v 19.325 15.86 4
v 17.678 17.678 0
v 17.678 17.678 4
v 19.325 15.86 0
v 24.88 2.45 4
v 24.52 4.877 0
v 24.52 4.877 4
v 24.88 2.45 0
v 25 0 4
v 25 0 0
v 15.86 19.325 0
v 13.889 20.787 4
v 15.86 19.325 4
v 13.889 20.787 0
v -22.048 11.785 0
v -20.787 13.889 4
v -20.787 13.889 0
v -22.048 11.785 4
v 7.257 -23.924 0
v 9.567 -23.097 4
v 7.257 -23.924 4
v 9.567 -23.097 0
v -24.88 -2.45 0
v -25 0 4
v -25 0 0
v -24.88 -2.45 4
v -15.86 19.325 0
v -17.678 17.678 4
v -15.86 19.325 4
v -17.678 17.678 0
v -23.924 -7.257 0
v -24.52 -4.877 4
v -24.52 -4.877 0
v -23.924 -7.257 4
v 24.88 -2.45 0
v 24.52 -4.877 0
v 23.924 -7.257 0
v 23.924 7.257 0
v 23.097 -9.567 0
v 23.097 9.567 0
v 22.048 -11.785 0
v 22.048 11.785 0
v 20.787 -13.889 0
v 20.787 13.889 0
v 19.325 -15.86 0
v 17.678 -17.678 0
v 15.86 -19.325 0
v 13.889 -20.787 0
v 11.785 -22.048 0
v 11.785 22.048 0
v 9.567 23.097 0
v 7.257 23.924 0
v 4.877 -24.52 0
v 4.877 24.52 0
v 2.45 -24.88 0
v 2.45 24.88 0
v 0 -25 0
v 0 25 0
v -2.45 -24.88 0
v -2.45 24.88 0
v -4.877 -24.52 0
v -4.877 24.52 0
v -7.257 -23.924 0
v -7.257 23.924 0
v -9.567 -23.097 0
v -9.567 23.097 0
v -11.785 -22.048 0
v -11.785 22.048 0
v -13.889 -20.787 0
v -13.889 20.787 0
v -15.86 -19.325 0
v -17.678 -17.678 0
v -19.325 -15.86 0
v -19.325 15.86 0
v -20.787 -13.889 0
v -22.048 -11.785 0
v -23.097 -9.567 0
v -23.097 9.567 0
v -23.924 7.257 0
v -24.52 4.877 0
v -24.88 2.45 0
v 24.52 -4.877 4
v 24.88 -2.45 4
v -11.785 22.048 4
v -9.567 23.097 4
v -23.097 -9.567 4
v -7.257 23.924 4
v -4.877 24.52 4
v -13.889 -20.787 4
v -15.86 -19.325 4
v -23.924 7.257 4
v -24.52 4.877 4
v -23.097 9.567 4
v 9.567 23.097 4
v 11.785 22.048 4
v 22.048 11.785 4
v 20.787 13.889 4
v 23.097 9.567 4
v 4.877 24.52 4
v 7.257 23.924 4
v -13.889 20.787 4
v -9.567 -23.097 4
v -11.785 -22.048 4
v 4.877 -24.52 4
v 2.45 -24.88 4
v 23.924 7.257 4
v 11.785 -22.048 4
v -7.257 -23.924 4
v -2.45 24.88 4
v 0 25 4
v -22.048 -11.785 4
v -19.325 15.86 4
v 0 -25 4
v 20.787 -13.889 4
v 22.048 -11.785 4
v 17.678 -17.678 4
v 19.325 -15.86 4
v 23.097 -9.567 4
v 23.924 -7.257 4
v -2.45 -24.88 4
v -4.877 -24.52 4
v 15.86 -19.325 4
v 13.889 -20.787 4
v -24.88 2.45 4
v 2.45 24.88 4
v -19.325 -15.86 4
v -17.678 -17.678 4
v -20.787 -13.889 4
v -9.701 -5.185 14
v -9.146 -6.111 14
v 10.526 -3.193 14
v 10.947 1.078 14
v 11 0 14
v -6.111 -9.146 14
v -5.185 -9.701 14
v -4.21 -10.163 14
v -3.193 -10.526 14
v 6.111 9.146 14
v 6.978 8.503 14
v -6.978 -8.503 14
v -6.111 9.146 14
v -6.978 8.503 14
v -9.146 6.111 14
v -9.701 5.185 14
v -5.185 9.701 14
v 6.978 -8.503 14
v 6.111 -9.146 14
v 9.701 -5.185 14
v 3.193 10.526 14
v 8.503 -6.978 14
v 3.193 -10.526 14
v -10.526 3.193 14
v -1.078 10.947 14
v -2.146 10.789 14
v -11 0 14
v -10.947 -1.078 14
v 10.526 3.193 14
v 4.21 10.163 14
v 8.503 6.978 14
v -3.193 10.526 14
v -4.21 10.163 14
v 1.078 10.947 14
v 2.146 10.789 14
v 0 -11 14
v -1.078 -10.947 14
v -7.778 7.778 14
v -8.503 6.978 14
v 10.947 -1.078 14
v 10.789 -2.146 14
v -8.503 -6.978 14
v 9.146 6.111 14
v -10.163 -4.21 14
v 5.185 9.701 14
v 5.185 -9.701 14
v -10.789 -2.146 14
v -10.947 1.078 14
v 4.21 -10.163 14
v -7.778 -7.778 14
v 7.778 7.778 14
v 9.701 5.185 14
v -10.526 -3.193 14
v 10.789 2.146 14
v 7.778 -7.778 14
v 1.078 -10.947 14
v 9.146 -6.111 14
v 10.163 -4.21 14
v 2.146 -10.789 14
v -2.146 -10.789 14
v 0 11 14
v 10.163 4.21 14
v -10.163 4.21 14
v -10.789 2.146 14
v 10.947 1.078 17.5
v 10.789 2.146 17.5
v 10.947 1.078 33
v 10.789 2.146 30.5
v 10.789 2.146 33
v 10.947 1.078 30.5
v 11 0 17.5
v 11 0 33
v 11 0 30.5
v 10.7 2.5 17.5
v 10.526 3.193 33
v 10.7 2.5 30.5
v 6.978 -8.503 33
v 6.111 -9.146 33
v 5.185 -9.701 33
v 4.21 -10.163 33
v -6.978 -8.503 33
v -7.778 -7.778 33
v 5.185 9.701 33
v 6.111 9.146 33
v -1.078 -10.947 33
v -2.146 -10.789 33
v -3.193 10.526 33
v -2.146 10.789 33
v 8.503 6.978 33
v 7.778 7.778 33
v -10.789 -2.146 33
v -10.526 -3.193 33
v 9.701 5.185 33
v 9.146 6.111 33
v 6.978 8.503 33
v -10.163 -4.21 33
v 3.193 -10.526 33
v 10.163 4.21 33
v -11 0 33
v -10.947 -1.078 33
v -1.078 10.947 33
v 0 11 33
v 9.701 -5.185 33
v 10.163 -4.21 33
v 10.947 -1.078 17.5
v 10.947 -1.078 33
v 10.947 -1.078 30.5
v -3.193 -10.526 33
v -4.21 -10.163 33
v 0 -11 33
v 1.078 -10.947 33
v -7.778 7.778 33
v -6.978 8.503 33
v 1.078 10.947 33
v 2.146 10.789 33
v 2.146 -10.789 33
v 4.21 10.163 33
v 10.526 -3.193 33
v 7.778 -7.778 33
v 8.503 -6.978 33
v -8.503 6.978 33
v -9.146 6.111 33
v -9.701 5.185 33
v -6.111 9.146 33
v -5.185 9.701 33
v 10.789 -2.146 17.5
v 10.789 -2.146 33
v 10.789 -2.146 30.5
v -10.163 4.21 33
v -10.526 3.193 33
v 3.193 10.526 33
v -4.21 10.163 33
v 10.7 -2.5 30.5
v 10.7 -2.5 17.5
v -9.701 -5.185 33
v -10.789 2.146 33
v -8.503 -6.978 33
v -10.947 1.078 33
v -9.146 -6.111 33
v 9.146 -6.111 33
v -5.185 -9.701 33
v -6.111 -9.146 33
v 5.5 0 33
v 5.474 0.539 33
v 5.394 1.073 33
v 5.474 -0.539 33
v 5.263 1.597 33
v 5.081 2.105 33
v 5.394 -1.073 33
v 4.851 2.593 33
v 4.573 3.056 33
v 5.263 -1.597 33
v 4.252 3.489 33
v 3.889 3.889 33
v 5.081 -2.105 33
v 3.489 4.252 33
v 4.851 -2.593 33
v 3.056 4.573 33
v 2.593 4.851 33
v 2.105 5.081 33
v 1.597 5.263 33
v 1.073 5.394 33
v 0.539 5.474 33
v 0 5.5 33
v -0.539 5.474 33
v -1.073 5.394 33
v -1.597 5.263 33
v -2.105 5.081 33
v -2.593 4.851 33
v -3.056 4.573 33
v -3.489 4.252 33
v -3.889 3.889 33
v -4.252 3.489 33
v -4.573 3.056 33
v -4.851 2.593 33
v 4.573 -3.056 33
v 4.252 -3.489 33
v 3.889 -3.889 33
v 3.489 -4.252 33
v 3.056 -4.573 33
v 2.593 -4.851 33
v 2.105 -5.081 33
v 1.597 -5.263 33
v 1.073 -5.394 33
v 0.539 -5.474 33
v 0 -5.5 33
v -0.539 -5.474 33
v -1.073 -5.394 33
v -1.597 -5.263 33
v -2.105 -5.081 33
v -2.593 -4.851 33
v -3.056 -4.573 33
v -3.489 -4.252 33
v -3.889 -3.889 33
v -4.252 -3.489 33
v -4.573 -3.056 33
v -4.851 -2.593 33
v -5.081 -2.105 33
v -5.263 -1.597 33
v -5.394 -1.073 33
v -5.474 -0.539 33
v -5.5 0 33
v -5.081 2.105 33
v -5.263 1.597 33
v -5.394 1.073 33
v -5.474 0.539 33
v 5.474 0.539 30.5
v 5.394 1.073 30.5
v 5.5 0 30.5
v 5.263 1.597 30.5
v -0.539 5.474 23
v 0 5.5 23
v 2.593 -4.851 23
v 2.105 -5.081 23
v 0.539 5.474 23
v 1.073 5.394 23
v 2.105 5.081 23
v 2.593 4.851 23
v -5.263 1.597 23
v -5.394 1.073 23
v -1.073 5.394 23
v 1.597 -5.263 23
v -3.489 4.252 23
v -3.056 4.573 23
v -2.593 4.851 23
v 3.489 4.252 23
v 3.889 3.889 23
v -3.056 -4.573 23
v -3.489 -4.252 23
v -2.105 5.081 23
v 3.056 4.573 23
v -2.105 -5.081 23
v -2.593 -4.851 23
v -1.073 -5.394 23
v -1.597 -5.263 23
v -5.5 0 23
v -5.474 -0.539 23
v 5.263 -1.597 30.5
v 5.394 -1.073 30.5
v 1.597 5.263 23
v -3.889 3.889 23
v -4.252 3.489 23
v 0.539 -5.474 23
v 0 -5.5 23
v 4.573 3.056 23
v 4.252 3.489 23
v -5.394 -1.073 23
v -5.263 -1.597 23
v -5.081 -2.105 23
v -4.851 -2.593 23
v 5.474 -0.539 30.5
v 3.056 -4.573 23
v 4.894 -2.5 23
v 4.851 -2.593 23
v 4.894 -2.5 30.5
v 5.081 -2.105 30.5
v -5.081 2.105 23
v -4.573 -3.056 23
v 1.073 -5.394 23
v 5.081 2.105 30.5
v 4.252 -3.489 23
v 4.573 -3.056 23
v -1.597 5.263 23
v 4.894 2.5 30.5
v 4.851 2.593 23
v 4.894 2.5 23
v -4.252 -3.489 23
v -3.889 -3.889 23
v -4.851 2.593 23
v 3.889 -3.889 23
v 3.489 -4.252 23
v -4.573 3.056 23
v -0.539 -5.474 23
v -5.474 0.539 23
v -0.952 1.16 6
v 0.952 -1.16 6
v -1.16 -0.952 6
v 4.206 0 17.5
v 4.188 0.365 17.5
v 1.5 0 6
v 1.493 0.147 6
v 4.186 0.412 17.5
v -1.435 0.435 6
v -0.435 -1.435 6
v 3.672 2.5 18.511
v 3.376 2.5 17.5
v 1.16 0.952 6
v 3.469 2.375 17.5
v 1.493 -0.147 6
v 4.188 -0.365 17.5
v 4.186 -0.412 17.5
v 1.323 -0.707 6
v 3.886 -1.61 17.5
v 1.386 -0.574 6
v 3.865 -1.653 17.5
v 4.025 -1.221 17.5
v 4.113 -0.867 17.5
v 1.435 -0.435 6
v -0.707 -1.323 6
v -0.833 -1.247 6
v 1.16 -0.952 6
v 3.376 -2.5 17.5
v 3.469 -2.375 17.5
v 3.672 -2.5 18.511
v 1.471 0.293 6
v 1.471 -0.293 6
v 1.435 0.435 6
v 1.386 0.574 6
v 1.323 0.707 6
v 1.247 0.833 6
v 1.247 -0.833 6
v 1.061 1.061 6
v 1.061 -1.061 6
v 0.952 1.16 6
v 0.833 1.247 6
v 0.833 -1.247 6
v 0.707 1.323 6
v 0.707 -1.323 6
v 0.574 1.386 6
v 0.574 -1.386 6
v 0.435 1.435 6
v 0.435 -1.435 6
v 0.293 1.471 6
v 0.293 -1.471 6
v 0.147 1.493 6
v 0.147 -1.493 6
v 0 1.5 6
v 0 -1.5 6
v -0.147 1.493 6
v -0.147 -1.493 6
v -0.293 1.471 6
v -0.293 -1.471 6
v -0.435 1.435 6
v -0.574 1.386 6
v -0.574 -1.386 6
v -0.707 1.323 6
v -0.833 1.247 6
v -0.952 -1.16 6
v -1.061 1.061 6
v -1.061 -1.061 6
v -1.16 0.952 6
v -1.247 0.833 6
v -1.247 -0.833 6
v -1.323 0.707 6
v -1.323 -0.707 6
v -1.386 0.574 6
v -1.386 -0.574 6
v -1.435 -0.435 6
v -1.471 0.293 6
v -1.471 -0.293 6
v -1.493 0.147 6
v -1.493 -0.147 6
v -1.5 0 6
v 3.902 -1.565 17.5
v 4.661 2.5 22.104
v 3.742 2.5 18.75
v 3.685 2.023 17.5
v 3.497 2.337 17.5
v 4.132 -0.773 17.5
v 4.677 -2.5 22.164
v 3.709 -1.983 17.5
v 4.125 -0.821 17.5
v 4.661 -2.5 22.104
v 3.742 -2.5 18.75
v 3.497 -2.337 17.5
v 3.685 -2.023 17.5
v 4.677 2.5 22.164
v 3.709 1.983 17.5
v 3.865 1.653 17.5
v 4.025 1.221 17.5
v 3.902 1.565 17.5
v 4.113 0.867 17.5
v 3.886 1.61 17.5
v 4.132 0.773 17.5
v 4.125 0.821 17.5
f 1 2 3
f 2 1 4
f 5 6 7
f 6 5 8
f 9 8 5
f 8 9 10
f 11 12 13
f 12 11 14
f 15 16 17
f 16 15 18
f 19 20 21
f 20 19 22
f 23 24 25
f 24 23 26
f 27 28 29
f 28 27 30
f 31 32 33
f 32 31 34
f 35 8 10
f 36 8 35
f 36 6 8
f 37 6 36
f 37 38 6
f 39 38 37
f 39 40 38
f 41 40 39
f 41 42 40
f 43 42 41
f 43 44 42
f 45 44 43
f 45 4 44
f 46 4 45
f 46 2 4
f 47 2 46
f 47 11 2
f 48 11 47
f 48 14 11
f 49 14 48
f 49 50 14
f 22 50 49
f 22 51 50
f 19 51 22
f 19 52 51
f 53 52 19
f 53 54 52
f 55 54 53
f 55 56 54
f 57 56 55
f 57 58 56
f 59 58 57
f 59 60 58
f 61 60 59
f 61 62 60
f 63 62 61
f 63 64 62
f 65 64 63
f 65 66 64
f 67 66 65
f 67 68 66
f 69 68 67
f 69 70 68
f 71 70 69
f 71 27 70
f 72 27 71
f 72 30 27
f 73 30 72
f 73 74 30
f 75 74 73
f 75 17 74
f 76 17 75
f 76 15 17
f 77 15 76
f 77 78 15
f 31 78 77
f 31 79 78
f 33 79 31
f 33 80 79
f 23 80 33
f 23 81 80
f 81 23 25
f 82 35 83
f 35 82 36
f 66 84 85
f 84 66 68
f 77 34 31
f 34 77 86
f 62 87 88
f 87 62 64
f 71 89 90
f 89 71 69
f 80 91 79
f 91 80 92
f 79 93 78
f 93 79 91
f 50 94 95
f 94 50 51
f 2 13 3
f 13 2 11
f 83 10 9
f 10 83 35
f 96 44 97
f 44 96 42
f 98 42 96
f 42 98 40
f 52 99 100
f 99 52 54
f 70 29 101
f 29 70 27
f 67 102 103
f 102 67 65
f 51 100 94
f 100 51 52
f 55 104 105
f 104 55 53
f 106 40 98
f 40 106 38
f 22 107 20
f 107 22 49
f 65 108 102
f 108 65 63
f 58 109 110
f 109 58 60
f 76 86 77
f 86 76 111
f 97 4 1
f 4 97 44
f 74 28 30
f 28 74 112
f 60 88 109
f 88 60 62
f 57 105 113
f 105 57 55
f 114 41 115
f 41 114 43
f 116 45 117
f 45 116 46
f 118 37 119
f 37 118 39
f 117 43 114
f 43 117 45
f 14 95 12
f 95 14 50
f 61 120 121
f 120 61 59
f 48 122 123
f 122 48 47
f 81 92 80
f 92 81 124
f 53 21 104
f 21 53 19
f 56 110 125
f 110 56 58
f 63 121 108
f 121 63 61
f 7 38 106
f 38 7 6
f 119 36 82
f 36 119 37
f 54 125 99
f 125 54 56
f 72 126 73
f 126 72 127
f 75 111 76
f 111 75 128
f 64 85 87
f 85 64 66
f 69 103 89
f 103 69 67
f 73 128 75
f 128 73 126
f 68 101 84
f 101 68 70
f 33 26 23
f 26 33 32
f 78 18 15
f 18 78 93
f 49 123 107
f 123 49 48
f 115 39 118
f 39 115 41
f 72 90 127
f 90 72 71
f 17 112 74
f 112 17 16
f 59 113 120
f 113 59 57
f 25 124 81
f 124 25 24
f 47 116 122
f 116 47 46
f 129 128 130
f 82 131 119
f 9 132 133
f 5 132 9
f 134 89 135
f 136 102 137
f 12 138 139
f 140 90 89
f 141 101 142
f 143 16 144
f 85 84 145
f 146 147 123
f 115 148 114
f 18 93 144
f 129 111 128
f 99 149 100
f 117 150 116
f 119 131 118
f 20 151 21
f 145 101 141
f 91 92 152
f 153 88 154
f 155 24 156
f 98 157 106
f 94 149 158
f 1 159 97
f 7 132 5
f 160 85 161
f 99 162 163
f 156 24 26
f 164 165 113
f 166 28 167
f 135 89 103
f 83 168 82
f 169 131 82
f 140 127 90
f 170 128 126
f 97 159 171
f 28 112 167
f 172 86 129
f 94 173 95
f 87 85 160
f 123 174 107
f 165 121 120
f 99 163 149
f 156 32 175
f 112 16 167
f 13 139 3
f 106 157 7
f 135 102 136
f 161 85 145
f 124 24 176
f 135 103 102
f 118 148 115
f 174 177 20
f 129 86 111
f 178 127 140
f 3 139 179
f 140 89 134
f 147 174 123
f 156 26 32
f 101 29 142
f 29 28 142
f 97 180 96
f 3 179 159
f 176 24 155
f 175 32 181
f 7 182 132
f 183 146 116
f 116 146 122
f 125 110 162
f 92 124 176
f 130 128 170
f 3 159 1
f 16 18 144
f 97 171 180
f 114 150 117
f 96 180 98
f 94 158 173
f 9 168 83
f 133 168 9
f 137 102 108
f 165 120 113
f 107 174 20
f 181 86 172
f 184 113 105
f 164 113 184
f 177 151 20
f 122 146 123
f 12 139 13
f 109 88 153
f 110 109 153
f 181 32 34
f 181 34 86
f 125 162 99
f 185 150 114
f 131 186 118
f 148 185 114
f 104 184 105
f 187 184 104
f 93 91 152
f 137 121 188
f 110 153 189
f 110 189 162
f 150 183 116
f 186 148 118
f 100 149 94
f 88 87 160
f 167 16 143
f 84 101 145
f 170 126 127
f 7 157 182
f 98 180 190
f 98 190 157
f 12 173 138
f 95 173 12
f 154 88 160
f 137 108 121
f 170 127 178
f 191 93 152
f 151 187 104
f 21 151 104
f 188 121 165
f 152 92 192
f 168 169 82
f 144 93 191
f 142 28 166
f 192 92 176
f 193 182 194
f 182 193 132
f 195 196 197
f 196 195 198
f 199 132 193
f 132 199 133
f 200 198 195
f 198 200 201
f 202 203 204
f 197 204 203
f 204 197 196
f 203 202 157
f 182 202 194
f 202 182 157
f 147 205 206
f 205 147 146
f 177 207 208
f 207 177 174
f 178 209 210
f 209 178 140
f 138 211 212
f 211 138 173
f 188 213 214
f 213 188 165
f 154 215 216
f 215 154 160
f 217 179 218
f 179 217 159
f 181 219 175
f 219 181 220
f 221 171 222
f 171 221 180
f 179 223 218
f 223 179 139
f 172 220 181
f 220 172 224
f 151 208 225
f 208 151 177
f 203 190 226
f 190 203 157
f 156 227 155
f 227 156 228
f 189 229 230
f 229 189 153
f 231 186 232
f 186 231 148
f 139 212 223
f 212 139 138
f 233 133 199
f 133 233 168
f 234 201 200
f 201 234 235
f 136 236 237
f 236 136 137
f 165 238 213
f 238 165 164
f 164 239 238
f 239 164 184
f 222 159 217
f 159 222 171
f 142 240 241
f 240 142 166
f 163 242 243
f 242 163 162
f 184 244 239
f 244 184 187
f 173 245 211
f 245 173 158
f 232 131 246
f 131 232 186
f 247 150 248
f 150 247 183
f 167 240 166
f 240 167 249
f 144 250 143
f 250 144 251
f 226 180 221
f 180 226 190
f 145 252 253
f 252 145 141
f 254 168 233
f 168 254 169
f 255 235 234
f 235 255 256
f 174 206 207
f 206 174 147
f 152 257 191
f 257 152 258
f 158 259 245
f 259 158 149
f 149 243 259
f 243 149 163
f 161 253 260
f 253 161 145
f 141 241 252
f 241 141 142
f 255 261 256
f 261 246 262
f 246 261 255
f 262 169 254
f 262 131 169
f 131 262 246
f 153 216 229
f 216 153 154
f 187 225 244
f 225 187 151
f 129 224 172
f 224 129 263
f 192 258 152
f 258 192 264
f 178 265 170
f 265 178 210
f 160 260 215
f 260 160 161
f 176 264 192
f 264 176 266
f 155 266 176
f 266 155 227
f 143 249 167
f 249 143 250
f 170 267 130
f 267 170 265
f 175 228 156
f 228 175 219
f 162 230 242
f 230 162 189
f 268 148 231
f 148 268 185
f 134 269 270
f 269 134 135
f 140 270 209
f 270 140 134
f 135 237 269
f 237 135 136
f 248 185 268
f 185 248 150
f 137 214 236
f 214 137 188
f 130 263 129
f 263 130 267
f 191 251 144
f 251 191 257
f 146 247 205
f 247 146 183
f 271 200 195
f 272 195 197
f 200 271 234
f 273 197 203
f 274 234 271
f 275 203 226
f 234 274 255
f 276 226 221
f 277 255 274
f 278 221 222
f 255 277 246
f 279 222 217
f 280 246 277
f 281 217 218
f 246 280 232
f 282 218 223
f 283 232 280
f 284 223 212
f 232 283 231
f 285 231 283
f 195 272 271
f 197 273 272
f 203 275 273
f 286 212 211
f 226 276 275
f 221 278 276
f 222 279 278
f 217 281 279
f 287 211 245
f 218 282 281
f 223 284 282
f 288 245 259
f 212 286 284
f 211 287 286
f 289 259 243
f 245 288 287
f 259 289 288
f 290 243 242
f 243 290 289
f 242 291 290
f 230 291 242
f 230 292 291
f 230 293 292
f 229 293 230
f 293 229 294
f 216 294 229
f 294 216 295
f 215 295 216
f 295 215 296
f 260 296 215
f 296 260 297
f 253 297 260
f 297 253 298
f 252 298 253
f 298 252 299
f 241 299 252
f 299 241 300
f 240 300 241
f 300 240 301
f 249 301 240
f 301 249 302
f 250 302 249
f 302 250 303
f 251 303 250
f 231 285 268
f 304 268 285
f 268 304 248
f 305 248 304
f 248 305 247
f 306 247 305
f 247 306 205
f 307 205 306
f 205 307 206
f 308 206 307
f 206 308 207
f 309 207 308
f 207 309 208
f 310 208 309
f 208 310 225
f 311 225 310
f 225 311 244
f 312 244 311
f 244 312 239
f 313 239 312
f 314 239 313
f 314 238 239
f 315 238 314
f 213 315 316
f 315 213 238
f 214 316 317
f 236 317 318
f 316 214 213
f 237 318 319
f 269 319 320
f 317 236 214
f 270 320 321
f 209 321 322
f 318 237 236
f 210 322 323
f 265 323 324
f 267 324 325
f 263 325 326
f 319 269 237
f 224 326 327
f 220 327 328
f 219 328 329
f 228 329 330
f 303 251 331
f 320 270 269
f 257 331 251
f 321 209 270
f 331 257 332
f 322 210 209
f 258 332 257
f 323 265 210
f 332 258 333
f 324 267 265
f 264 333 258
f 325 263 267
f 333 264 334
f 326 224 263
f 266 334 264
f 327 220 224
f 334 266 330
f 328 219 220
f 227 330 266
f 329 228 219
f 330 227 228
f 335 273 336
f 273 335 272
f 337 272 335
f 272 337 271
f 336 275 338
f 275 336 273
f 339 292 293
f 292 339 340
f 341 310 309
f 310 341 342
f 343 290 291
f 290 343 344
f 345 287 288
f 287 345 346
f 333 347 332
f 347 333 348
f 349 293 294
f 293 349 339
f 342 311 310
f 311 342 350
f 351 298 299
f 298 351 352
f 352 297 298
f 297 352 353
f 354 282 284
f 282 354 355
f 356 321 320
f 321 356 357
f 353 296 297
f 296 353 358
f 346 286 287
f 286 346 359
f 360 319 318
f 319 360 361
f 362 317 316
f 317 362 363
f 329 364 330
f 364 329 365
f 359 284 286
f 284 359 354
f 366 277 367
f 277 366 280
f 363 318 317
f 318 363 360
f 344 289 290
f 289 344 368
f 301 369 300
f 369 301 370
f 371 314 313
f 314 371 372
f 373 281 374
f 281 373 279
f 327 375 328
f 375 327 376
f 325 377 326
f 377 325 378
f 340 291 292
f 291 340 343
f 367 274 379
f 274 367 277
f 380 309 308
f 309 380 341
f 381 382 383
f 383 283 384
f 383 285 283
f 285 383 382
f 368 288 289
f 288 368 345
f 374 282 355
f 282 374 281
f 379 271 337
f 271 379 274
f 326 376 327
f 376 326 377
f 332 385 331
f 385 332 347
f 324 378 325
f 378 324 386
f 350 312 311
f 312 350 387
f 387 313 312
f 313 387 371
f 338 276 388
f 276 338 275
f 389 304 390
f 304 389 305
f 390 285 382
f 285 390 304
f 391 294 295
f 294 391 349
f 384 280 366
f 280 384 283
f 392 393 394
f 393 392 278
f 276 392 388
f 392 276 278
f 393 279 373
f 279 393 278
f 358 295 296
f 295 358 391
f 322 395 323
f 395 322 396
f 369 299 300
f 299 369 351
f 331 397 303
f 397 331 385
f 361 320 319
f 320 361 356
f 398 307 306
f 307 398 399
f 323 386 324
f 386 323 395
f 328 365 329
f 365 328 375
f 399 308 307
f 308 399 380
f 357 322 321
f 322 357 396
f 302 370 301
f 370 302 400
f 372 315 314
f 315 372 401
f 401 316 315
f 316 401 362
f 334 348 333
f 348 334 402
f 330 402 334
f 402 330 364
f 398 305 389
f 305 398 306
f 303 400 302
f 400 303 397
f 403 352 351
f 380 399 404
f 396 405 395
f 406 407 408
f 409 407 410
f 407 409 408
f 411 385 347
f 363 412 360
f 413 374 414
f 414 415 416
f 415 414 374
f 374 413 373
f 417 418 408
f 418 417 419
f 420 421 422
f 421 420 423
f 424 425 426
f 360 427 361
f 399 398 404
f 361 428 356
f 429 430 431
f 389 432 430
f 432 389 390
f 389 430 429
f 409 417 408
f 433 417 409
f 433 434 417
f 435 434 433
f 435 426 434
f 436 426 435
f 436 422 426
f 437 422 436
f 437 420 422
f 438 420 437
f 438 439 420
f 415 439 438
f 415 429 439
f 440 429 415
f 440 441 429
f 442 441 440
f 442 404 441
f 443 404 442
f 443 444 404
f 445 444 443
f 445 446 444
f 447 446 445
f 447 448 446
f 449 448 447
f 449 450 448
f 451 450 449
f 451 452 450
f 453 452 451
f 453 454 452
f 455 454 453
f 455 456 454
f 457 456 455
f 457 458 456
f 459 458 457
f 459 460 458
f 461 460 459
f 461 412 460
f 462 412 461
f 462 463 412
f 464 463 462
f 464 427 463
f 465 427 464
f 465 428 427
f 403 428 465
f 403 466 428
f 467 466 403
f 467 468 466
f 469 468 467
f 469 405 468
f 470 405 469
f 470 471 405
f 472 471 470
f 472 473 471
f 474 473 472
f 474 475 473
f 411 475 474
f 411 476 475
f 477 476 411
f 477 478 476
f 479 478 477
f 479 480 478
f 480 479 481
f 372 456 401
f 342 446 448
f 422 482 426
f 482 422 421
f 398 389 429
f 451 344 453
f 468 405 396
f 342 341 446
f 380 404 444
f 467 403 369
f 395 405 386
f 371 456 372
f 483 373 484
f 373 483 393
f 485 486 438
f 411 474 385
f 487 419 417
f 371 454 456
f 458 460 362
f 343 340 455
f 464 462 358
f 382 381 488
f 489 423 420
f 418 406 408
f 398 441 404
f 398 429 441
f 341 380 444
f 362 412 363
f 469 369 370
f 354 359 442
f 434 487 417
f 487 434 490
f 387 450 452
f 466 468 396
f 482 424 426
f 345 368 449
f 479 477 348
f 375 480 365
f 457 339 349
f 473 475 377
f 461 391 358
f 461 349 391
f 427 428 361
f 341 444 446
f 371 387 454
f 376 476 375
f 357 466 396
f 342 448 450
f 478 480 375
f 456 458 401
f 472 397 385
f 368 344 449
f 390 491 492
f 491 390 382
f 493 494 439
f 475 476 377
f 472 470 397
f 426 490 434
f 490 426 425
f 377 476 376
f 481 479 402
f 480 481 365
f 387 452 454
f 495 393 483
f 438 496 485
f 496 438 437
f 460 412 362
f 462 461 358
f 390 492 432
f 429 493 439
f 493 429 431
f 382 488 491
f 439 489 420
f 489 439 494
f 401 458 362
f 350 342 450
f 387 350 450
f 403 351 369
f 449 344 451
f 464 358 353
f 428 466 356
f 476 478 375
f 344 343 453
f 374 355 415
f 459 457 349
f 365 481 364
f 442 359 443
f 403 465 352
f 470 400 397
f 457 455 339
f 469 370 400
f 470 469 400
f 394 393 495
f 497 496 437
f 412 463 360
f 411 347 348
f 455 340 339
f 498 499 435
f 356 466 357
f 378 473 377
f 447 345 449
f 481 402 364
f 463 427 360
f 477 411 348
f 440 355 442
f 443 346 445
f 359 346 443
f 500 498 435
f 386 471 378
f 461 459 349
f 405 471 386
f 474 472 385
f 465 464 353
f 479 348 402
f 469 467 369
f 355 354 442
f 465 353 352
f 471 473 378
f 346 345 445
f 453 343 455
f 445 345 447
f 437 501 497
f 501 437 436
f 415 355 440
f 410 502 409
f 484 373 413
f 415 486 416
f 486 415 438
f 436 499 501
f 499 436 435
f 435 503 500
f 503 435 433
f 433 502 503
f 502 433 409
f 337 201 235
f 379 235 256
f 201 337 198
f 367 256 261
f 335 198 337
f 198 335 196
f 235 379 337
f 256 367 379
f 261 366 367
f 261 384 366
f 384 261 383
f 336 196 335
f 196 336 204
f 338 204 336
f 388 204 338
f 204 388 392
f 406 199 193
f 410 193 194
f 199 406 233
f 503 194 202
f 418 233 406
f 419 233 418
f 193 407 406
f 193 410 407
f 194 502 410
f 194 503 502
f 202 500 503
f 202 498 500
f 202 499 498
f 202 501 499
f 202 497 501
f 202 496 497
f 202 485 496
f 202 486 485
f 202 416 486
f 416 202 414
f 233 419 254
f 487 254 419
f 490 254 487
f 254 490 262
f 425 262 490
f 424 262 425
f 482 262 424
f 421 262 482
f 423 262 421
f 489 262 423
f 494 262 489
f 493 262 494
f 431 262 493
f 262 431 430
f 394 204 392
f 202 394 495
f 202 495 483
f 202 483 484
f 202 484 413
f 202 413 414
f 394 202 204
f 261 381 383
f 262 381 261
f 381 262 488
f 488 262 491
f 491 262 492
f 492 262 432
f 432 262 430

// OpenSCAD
// Dimensions (mm)
base_diameter = 50;
base_height = 4;

cone_bottom_diameter = 50;  // at z=4
cone_top_diameter = 22;     // at z=14
cone_height = 10;           // from z=4 to z=14

column_diameter = 22;
column_height = 19;         // from z=14 to z=33

seat_diameter_top = 11;     // from z=33 down to z=23
seat_top_z = 33;
seat_cone_start_z = 23;

cone_tip_diameter = 3;
cone_tip_z = 6;

viewing_window_width = 4;   // in Y direction
window_z_min = 18;
window_z_max = 30;

$fn = 64;

// Build the final part
difference() {
    // Main shape: base + cone + column
    union() {
        // Base disc
        cylinder(d = base_diameter, h = base_height);
        
        // Cone from z=4 to z=14
        translate([0, 0, base_height])
            cylinder(d1 = cone_bottom_diameter, d2 = cone_top_diameter, h = cone_height);
        
        // Column from z=14 to z=33
        translate([0, 0, base_height + cone_height])
            cylinder(d = column_diameter, h = column_height);
    }
    
    // Subtract: cylindrical part of the seat from z=23 to z=33 (diameter 11 mm)
    translate([0, 0, seat_cone_start_z])
        cylinder(d = seat_diameter_top, h = seat_top_z - seat_cone_start_z);
    
    // Subtract: cone from z=6 to z=23, narrowing from 3 mm to 11 mm
    translate([0, 0, cone_tip_z])
        cylinder(d1 = cone_tip_diameter, d2 = seat_diameter_top, h = seat_cone_start_z - cone_tip_z);
    
    // Subtract: viewing window (4 mm wide in Y, on +X side, from z=18 to z=30)
    translate([0, -viewing_window_width/2 - 0.5, window_z_min - 0.5])
        cube([12, viewing_window_width + 1, window_z_max - window_z_min + 1]);
}
